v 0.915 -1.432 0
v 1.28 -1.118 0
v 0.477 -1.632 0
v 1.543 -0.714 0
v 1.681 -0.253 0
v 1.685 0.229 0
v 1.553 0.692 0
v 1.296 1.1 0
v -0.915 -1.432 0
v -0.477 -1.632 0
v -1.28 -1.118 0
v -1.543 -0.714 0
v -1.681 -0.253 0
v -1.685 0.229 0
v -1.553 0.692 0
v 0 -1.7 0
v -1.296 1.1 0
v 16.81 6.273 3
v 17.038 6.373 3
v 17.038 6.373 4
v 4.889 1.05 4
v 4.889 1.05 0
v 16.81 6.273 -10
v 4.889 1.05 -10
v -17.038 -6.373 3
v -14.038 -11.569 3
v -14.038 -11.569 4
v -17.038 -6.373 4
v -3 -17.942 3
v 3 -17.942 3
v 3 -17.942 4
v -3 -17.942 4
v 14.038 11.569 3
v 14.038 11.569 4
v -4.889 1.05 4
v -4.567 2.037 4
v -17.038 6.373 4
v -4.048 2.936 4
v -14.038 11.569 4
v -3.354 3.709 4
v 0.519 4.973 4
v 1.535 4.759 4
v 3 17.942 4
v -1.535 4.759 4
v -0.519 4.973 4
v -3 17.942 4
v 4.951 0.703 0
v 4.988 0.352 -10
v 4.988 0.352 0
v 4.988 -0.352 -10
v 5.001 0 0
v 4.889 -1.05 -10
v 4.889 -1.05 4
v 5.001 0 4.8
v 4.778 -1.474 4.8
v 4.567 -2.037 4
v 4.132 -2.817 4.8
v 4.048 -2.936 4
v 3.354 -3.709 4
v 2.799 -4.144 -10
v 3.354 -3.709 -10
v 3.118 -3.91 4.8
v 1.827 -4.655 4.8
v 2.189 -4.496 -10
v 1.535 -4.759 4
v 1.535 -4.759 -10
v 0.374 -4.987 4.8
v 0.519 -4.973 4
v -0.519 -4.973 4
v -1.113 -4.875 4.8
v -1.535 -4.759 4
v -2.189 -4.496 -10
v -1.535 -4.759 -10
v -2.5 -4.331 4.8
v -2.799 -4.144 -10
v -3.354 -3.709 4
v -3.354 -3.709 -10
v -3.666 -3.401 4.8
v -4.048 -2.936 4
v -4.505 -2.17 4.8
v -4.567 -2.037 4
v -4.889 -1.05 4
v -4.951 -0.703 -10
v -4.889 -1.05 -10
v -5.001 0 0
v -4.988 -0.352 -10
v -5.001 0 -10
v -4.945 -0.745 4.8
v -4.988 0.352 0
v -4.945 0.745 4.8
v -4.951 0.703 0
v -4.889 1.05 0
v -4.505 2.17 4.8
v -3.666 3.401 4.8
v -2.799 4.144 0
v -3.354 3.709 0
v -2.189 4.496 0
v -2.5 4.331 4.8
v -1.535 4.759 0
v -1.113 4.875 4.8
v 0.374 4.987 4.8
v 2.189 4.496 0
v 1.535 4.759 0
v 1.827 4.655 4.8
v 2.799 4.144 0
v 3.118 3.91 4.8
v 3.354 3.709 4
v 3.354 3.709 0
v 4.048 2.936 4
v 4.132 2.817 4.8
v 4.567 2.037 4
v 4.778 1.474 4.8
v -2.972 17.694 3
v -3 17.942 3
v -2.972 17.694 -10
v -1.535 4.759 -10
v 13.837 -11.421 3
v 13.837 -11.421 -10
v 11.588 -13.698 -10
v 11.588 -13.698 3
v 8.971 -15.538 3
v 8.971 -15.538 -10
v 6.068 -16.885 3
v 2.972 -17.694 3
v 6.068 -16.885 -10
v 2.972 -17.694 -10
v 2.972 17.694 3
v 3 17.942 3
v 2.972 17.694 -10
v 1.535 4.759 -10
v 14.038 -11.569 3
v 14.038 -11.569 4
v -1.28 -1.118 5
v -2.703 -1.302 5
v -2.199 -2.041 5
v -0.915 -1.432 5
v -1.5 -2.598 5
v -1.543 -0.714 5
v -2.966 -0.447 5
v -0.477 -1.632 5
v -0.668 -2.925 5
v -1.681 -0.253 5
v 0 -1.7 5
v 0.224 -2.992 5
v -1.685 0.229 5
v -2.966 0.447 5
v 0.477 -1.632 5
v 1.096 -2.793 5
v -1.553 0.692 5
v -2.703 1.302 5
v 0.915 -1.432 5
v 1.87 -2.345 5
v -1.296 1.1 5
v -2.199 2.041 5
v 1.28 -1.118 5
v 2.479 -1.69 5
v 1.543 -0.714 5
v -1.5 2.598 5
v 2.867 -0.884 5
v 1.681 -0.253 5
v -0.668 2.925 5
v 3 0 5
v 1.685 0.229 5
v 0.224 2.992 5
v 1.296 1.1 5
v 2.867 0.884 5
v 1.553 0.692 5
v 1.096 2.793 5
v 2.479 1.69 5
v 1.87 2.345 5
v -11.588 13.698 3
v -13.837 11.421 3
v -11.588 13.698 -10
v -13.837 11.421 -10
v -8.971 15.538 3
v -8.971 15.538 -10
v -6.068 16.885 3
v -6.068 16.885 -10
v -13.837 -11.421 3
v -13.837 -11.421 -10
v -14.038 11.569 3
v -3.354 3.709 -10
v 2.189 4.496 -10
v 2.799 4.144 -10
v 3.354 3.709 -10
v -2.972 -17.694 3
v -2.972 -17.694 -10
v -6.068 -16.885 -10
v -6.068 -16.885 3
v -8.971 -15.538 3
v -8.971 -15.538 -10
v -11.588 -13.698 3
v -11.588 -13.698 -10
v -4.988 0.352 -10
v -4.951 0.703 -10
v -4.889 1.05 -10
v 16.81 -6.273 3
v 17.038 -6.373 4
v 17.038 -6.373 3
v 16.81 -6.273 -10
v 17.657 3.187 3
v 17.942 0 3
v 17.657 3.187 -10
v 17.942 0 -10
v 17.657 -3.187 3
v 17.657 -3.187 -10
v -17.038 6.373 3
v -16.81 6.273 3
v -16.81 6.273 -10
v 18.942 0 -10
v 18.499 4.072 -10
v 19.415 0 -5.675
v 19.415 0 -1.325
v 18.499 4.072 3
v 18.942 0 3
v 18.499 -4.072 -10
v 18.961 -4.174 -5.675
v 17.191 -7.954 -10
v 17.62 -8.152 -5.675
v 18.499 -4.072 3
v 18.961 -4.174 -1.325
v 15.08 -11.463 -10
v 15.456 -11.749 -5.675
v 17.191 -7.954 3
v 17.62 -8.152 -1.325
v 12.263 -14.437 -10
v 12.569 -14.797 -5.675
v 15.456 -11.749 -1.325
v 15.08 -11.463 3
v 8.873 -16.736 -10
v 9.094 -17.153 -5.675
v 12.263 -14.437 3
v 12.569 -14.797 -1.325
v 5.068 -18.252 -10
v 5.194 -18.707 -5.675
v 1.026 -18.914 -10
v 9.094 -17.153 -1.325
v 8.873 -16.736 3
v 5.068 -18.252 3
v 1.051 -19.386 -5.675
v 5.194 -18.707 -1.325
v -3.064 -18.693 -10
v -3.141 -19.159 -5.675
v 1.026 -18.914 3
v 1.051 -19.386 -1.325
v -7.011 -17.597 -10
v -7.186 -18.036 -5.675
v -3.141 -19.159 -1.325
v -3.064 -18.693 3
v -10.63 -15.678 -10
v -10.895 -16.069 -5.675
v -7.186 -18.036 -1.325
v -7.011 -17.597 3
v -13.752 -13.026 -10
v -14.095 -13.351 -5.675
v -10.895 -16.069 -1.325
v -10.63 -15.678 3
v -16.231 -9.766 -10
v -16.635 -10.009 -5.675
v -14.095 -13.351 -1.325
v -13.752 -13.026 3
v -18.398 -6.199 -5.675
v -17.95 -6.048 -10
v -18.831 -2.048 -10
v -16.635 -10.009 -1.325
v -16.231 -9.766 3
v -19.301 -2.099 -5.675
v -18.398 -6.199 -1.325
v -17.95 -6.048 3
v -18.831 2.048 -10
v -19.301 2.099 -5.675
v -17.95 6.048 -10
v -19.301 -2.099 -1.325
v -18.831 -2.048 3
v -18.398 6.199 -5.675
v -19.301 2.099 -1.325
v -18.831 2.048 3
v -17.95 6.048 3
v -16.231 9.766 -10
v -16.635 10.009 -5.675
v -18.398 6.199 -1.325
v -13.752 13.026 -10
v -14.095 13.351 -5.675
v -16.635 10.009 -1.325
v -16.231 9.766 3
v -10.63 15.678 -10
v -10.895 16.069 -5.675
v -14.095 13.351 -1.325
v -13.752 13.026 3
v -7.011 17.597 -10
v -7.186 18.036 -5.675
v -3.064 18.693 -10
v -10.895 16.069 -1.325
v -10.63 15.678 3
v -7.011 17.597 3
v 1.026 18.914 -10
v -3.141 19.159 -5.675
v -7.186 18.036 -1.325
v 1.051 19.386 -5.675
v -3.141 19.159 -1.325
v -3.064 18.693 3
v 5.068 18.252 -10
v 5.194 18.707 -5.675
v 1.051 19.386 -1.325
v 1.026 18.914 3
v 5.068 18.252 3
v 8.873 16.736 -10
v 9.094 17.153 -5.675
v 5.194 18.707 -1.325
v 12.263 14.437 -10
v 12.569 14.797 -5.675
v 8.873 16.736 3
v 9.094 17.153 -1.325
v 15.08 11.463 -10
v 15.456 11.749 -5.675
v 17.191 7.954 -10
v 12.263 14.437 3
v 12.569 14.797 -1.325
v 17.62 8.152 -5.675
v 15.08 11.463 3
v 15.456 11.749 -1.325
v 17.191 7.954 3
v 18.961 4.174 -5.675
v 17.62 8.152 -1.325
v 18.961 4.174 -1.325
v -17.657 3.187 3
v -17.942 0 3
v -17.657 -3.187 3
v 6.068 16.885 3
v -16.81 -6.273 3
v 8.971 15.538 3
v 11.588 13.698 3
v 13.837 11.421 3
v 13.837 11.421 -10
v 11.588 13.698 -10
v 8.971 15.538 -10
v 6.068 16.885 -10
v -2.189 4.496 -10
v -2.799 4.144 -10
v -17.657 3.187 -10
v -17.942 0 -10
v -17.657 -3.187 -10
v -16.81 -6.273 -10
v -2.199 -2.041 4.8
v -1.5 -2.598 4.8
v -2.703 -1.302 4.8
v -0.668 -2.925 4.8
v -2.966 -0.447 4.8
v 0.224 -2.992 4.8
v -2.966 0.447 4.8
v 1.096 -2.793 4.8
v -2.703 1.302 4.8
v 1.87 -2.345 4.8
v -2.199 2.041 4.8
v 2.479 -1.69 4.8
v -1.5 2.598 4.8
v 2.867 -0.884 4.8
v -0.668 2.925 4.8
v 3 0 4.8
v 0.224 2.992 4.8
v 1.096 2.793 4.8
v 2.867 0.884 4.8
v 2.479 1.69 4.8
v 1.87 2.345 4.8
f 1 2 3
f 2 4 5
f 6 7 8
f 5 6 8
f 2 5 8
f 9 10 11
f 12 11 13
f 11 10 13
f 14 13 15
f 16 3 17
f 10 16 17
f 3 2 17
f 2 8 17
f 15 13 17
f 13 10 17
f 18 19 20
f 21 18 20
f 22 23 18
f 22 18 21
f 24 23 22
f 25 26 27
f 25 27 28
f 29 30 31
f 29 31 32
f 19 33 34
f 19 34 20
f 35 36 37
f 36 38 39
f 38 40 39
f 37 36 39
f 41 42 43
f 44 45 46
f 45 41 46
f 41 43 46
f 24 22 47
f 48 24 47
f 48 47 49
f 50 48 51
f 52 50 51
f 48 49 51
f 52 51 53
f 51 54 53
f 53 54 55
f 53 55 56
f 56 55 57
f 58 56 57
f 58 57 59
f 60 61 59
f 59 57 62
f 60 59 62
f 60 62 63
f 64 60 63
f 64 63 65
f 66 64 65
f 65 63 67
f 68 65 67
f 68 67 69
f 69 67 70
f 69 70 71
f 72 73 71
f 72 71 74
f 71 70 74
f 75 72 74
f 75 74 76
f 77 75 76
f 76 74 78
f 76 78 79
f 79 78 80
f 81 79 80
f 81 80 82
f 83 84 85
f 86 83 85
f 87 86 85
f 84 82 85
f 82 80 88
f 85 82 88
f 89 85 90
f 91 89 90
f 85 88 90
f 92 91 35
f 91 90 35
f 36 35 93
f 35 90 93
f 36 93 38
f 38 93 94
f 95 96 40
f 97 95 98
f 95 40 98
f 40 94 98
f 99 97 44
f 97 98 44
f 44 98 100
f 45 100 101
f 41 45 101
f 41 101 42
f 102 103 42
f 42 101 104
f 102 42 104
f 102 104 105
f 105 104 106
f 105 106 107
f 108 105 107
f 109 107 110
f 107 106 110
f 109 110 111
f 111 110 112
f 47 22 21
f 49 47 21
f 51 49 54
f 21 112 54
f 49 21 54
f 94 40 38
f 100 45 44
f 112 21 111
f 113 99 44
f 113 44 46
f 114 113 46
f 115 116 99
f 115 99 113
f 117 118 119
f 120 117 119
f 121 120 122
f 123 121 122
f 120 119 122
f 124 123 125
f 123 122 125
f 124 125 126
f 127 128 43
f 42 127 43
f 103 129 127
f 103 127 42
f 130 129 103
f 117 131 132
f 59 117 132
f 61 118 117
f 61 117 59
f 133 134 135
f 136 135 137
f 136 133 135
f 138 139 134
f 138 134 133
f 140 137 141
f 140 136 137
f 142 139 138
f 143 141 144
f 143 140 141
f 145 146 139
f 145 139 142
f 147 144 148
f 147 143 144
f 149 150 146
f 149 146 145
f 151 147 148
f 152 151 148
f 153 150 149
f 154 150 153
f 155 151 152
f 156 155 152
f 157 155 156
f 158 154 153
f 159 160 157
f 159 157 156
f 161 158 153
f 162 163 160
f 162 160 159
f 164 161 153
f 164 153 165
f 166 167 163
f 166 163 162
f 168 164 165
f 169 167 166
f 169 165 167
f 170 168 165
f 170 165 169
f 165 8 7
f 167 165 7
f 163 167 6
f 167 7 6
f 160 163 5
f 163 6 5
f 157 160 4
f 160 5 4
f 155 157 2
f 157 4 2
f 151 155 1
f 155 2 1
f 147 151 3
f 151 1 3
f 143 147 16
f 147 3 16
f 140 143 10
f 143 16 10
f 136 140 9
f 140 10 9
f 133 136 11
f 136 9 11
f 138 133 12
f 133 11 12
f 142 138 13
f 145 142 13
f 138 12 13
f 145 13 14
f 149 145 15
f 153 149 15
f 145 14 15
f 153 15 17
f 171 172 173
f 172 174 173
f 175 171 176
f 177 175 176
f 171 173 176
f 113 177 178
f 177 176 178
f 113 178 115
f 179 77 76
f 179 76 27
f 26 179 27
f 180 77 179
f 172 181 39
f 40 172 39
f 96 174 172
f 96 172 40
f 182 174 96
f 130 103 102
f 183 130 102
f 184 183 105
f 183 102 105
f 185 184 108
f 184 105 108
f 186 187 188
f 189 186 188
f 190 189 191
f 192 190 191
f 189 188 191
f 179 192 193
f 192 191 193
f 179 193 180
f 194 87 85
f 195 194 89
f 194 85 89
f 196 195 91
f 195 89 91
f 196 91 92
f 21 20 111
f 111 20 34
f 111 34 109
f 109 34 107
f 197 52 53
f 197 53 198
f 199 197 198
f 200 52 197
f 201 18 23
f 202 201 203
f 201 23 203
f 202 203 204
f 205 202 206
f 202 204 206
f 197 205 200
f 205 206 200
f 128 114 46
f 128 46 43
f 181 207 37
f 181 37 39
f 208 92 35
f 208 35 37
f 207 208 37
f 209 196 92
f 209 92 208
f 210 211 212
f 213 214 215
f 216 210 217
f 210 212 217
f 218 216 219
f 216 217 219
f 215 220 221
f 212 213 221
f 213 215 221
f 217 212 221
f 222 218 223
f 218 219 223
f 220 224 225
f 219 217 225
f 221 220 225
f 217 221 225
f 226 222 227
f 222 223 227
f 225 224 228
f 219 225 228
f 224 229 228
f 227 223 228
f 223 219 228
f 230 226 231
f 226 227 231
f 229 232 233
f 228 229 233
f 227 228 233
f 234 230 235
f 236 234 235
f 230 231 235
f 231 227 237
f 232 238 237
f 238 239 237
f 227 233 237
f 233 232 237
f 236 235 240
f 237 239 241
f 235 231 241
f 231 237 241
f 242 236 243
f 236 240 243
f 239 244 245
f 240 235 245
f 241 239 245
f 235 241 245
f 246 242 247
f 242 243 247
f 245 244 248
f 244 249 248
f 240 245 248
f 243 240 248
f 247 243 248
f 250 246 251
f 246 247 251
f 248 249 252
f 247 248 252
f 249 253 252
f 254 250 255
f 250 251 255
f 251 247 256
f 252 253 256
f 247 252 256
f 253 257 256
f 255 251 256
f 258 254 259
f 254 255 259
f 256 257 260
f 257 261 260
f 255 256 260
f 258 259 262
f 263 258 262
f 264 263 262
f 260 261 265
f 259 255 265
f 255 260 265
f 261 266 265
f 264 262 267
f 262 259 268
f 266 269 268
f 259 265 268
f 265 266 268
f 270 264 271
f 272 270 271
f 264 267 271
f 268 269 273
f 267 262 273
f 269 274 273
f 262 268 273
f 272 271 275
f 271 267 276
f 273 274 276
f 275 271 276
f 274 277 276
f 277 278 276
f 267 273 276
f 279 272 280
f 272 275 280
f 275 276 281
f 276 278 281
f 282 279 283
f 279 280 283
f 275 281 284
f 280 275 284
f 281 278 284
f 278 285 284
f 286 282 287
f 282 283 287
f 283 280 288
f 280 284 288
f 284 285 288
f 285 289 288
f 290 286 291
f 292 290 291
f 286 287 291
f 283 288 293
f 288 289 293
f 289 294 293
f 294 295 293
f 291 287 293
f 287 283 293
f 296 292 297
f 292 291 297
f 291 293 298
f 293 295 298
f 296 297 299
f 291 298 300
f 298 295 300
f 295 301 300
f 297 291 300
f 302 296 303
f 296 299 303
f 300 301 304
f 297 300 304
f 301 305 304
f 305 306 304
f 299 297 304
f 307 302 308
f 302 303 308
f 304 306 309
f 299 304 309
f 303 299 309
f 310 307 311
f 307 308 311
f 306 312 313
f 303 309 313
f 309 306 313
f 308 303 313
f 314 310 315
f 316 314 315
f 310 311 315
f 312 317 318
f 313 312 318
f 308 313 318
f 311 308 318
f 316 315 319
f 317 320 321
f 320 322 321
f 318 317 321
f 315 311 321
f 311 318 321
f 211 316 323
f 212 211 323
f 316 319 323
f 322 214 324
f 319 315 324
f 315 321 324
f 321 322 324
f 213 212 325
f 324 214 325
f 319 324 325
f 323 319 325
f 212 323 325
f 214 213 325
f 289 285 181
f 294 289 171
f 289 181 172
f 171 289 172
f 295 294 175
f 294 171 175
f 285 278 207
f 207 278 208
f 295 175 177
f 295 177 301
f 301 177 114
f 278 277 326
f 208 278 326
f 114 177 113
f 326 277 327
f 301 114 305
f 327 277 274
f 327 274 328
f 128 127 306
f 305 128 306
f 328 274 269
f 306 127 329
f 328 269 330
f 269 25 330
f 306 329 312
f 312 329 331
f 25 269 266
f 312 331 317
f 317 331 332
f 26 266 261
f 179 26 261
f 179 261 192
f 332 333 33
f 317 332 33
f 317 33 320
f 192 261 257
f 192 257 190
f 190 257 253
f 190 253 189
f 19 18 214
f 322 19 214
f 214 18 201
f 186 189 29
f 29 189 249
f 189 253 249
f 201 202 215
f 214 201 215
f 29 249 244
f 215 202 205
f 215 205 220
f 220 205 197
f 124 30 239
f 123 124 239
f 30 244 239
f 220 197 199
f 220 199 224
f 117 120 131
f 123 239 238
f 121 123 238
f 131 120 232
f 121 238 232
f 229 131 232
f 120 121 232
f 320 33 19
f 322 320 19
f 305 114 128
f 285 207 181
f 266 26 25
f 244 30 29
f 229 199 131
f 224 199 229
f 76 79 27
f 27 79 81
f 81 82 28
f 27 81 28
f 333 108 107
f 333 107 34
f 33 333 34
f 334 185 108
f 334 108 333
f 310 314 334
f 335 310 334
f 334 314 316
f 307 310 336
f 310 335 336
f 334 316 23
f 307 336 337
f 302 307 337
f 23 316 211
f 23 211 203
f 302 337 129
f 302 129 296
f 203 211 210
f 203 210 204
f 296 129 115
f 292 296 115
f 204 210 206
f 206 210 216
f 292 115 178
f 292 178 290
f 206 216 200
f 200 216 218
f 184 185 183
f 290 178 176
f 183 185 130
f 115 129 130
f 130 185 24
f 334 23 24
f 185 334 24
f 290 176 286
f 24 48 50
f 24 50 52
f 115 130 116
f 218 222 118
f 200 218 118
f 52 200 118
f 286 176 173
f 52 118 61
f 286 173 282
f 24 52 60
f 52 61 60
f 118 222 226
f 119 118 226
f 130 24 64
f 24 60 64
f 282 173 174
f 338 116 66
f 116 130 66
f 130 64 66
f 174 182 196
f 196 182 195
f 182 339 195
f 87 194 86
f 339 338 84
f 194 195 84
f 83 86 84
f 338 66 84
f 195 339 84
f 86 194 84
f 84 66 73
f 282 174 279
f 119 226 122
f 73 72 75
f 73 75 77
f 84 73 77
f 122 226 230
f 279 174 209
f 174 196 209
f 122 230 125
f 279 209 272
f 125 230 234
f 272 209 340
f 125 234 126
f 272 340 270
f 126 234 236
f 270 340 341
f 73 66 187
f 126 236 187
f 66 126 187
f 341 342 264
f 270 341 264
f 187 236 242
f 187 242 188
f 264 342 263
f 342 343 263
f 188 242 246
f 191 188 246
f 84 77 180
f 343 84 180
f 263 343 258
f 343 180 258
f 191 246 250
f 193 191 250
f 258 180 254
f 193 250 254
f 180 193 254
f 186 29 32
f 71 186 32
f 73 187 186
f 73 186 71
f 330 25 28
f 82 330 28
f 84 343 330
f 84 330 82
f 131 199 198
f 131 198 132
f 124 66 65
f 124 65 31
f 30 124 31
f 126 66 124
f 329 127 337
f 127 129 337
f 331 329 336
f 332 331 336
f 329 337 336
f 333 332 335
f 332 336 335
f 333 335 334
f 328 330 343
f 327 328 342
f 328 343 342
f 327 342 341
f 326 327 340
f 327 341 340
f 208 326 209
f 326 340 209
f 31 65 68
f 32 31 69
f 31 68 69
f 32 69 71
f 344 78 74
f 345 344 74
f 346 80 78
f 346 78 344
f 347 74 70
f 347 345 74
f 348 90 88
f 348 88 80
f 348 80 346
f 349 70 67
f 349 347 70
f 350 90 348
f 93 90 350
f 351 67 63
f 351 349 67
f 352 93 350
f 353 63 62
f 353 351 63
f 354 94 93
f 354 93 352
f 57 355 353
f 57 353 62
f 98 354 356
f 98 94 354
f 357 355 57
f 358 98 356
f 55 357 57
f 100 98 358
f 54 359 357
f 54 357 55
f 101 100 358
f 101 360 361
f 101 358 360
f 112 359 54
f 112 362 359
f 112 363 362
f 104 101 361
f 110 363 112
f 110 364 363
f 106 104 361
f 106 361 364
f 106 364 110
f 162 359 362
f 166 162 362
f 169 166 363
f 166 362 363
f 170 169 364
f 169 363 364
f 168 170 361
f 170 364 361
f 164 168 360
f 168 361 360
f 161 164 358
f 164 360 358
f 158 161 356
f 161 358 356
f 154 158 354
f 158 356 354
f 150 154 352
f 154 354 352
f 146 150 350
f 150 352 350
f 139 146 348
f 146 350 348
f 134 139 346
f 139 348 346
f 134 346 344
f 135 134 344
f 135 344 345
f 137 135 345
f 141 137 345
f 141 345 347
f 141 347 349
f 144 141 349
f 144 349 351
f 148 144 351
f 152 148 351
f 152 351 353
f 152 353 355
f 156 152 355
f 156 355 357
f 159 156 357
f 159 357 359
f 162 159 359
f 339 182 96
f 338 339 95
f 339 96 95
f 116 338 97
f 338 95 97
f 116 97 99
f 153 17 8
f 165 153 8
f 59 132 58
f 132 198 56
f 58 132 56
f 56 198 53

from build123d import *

# Parameters (mm, degrees)
CROQUIS1_R              = 3
SALIENTE_EXTRUIR1_DEPTH = 5
CROQUIS2_R              = 5.000500025
SALIENTE_EXTRUIR2_DEPTH = 10
CROQUIS3_R              = 5.000500025
CROQUIS3_R_2            = 3
SALIENTE_EXTRUIR3_DEPTH = 4.8
SALIENTE_EXTRUIR4_DEPTH = 14


with BuildPart() as part:
    # Croquis1 → Saliente-Extruir1 (new body)
    with BuildSketch(Plane.XY):
        Circle(CROQUIS1_R)
        with BuildLine():
            Line((-1.29614814, 1.1), (1.29614814, 1.1))
            ThreePointArc((1.29614814, 1.1), (0, -1.7), (-1.29614814, 1.1))
        make_face(mode=Mode.SUBTRACT)
    extrude(amount=SALIENTE_EXTRUIR1_DEPTH)

    # Croquis2 → Saliente-Extruir2 (add)
    with BuildSketch(Plane(origin=(0, 0, 0), x_dir=(-1, 0, 0), z_dir=(0, 0, -1))):
        Circle(CROQUIS2_R)
    extrude(amount=SALIENTE_EXTRUIR2_DEPTH)

    # Croquis3 → Saliente-Extruir3 (add)
    with BuildSketch(Plane.XY):
        Circle(CROQUIS3_R)
        Circle(CROQUIS3_R_2, mode=Mode.SUBTRACT)
    extrude(amount=SALIENTE_EXTRUIR3_DEPTH)

    # Croquis4 → Saliente-Extruir4 (add)
    with BuildSketch(Plane(origin=(0, 0, -10), x_dir=(-1, 0, 0), z_dir=(0, 0, -1))):
        Polygon((-1.5, 4.442041839), (1.5, 4.442041839), (3, 17.942041839), (-3, 17.942041839), align=None)
        Polygon((17.038264028, 6.372944708), (14.038264028, 11.569097131), (3.096921077, 3.520059025), (4.596921077, 0.921982814), align=None)
        Polygon((14.038264028, -11.569097131), (17.038264028, -6.372944708), (4.596921077, -0.921982814), (3.096921077, -3.520059025), align=None)
        Polygon((-3, -17.942041839), (3, -17.942041839), (1.5, -4.442041839), (-1.5, -4.442041839), align=None)
        Polygon((-17.038264028, -6.372944708), (-14.038264028, -11.569097131), (-3.096921077, -3.520059025), (-4.596921077, -0.921982814), align=None)
        Polygon((-14.038264028, 11.569097131), (-17.038264028, 6.372944708), (-4.596921077, 0.921982814), (-3.096921077, 3.520059025), align=None)
    extrude(amount=-SALIENTE_EXTRUIR4_DEPTH)

    # Croquis6 → Revolución2 (revolve)
    with BuildSketch(Plane(origin=(0, 0, 0), x_dir=(0, 0, -1), z_dir=(1, 0, 0)), mode=Mode.PRIVATE) as revoluci_n2_sk:
        with BuildLine():
            Line((10, 17.942041839), (10, 18.942041839))
            ThreePointArc((10, 18.942041839), (3.5, 19.473700095), (-3, 18.942041839))
            Line((-3, 18.942041839), (-3, 17.942041839))
            Line((-3, 17.942041839), (10, 17.942041839))
        make_face()
    revolve(revoluci_n2_sk.sketch.rotate(Axis((0, 0, 4), (0, 0, -1)), 90), axis=Axis((0, 0, 4), (0, 0, -1)))


solid = part.part
